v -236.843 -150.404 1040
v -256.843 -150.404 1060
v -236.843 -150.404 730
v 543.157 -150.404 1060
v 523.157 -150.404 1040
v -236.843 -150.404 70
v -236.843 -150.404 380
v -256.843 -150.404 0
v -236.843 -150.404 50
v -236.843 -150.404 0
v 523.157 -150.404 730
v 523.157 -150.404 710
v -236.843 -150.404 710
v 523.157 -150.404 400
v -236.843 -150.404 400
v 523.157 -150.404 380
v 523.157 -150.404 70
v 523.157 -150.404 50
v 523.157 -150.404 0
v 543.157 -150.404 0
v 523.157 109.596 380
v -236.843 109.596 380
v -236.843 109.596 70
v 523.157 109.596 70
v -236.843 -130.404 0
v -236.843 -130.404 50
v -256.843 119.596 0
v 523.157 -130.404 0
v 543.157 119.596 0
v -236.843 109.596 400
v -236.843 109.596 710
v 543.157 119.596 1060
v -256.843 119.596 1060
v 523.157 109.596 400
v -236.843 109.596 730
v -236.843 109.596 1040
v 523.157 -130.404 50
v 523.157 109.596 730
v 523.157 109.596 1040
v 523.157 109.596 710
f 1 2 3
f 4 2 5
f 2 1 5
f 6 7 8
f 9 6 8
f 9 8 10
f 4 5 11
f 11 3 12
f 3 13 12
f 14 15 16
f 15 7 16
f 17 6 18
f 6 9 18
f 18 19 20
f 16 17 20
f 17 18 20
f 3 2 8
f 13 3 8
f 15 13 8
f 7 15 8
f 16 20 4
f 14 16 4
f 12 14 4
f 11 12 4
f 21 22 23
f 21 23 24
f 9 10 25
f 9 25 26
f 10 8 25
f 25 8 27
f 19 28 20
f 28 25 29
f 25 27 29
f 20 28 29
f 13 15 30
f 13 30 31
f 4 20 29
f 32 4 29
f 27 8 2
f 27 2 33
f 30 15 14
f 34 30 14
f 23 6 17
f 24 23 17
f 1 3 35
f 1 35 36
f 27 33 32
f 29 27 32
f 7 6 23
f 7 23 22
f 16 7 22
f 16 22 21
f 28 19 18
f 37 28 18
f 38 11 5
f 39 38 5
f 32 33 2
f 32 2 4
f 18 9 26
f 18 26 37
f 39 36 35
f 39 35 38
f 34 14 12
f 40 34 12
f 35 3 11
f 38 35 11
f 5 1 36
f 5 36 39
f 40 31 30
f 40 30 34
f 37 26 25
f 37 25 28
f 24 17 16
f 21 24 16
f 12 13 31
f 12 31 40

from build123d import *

# Parameters (mm, degrees)
F0_W     = 800
F0_H     = 270
F1_DEPTH = 1060
F2_W     = 760
F2_H     = 50
F3_DEPTH = 20
F4_W     = 760
F4_H     = 310
F5_DEPTH = 260


with BuildPart() as f1:
    # F0 (on Top) → F1 (new body)
    with BuildSketch(Plane.XY):
        with Locations((143.156862, -15.404297)):
            Rectangle(F0_W, F0_H)
    extrude(amount=F1_DEPTH)

    # F2 (on face) → F3 (cut)
    with BuildSketch(Plane.XZ.offset(150.404297)):
        with Locations((143.156862, 25)):
            Rectangle(F2_W, F2_H)
    extrude(amount=-F3_DEPTH, mode=Mode.SUBTRACT)

    # F4 (on face) → F5 (cut)
    with BuildSketch(Plane.XZ.offset(150.404297)):
        with Locations((143.156862, 885)):
            Rectangle(F4_W, F4_H)
        with Locations((143.156862, 555)):
            Rectangle(F4_W, F4_H)
        with Locations((143.156862, 225)):
            Rectangle(F4_W, F4_H)
    extrude(amount=-F5_DEPTH, mode=Mode.SUBTRACT)


solid = f1.part
